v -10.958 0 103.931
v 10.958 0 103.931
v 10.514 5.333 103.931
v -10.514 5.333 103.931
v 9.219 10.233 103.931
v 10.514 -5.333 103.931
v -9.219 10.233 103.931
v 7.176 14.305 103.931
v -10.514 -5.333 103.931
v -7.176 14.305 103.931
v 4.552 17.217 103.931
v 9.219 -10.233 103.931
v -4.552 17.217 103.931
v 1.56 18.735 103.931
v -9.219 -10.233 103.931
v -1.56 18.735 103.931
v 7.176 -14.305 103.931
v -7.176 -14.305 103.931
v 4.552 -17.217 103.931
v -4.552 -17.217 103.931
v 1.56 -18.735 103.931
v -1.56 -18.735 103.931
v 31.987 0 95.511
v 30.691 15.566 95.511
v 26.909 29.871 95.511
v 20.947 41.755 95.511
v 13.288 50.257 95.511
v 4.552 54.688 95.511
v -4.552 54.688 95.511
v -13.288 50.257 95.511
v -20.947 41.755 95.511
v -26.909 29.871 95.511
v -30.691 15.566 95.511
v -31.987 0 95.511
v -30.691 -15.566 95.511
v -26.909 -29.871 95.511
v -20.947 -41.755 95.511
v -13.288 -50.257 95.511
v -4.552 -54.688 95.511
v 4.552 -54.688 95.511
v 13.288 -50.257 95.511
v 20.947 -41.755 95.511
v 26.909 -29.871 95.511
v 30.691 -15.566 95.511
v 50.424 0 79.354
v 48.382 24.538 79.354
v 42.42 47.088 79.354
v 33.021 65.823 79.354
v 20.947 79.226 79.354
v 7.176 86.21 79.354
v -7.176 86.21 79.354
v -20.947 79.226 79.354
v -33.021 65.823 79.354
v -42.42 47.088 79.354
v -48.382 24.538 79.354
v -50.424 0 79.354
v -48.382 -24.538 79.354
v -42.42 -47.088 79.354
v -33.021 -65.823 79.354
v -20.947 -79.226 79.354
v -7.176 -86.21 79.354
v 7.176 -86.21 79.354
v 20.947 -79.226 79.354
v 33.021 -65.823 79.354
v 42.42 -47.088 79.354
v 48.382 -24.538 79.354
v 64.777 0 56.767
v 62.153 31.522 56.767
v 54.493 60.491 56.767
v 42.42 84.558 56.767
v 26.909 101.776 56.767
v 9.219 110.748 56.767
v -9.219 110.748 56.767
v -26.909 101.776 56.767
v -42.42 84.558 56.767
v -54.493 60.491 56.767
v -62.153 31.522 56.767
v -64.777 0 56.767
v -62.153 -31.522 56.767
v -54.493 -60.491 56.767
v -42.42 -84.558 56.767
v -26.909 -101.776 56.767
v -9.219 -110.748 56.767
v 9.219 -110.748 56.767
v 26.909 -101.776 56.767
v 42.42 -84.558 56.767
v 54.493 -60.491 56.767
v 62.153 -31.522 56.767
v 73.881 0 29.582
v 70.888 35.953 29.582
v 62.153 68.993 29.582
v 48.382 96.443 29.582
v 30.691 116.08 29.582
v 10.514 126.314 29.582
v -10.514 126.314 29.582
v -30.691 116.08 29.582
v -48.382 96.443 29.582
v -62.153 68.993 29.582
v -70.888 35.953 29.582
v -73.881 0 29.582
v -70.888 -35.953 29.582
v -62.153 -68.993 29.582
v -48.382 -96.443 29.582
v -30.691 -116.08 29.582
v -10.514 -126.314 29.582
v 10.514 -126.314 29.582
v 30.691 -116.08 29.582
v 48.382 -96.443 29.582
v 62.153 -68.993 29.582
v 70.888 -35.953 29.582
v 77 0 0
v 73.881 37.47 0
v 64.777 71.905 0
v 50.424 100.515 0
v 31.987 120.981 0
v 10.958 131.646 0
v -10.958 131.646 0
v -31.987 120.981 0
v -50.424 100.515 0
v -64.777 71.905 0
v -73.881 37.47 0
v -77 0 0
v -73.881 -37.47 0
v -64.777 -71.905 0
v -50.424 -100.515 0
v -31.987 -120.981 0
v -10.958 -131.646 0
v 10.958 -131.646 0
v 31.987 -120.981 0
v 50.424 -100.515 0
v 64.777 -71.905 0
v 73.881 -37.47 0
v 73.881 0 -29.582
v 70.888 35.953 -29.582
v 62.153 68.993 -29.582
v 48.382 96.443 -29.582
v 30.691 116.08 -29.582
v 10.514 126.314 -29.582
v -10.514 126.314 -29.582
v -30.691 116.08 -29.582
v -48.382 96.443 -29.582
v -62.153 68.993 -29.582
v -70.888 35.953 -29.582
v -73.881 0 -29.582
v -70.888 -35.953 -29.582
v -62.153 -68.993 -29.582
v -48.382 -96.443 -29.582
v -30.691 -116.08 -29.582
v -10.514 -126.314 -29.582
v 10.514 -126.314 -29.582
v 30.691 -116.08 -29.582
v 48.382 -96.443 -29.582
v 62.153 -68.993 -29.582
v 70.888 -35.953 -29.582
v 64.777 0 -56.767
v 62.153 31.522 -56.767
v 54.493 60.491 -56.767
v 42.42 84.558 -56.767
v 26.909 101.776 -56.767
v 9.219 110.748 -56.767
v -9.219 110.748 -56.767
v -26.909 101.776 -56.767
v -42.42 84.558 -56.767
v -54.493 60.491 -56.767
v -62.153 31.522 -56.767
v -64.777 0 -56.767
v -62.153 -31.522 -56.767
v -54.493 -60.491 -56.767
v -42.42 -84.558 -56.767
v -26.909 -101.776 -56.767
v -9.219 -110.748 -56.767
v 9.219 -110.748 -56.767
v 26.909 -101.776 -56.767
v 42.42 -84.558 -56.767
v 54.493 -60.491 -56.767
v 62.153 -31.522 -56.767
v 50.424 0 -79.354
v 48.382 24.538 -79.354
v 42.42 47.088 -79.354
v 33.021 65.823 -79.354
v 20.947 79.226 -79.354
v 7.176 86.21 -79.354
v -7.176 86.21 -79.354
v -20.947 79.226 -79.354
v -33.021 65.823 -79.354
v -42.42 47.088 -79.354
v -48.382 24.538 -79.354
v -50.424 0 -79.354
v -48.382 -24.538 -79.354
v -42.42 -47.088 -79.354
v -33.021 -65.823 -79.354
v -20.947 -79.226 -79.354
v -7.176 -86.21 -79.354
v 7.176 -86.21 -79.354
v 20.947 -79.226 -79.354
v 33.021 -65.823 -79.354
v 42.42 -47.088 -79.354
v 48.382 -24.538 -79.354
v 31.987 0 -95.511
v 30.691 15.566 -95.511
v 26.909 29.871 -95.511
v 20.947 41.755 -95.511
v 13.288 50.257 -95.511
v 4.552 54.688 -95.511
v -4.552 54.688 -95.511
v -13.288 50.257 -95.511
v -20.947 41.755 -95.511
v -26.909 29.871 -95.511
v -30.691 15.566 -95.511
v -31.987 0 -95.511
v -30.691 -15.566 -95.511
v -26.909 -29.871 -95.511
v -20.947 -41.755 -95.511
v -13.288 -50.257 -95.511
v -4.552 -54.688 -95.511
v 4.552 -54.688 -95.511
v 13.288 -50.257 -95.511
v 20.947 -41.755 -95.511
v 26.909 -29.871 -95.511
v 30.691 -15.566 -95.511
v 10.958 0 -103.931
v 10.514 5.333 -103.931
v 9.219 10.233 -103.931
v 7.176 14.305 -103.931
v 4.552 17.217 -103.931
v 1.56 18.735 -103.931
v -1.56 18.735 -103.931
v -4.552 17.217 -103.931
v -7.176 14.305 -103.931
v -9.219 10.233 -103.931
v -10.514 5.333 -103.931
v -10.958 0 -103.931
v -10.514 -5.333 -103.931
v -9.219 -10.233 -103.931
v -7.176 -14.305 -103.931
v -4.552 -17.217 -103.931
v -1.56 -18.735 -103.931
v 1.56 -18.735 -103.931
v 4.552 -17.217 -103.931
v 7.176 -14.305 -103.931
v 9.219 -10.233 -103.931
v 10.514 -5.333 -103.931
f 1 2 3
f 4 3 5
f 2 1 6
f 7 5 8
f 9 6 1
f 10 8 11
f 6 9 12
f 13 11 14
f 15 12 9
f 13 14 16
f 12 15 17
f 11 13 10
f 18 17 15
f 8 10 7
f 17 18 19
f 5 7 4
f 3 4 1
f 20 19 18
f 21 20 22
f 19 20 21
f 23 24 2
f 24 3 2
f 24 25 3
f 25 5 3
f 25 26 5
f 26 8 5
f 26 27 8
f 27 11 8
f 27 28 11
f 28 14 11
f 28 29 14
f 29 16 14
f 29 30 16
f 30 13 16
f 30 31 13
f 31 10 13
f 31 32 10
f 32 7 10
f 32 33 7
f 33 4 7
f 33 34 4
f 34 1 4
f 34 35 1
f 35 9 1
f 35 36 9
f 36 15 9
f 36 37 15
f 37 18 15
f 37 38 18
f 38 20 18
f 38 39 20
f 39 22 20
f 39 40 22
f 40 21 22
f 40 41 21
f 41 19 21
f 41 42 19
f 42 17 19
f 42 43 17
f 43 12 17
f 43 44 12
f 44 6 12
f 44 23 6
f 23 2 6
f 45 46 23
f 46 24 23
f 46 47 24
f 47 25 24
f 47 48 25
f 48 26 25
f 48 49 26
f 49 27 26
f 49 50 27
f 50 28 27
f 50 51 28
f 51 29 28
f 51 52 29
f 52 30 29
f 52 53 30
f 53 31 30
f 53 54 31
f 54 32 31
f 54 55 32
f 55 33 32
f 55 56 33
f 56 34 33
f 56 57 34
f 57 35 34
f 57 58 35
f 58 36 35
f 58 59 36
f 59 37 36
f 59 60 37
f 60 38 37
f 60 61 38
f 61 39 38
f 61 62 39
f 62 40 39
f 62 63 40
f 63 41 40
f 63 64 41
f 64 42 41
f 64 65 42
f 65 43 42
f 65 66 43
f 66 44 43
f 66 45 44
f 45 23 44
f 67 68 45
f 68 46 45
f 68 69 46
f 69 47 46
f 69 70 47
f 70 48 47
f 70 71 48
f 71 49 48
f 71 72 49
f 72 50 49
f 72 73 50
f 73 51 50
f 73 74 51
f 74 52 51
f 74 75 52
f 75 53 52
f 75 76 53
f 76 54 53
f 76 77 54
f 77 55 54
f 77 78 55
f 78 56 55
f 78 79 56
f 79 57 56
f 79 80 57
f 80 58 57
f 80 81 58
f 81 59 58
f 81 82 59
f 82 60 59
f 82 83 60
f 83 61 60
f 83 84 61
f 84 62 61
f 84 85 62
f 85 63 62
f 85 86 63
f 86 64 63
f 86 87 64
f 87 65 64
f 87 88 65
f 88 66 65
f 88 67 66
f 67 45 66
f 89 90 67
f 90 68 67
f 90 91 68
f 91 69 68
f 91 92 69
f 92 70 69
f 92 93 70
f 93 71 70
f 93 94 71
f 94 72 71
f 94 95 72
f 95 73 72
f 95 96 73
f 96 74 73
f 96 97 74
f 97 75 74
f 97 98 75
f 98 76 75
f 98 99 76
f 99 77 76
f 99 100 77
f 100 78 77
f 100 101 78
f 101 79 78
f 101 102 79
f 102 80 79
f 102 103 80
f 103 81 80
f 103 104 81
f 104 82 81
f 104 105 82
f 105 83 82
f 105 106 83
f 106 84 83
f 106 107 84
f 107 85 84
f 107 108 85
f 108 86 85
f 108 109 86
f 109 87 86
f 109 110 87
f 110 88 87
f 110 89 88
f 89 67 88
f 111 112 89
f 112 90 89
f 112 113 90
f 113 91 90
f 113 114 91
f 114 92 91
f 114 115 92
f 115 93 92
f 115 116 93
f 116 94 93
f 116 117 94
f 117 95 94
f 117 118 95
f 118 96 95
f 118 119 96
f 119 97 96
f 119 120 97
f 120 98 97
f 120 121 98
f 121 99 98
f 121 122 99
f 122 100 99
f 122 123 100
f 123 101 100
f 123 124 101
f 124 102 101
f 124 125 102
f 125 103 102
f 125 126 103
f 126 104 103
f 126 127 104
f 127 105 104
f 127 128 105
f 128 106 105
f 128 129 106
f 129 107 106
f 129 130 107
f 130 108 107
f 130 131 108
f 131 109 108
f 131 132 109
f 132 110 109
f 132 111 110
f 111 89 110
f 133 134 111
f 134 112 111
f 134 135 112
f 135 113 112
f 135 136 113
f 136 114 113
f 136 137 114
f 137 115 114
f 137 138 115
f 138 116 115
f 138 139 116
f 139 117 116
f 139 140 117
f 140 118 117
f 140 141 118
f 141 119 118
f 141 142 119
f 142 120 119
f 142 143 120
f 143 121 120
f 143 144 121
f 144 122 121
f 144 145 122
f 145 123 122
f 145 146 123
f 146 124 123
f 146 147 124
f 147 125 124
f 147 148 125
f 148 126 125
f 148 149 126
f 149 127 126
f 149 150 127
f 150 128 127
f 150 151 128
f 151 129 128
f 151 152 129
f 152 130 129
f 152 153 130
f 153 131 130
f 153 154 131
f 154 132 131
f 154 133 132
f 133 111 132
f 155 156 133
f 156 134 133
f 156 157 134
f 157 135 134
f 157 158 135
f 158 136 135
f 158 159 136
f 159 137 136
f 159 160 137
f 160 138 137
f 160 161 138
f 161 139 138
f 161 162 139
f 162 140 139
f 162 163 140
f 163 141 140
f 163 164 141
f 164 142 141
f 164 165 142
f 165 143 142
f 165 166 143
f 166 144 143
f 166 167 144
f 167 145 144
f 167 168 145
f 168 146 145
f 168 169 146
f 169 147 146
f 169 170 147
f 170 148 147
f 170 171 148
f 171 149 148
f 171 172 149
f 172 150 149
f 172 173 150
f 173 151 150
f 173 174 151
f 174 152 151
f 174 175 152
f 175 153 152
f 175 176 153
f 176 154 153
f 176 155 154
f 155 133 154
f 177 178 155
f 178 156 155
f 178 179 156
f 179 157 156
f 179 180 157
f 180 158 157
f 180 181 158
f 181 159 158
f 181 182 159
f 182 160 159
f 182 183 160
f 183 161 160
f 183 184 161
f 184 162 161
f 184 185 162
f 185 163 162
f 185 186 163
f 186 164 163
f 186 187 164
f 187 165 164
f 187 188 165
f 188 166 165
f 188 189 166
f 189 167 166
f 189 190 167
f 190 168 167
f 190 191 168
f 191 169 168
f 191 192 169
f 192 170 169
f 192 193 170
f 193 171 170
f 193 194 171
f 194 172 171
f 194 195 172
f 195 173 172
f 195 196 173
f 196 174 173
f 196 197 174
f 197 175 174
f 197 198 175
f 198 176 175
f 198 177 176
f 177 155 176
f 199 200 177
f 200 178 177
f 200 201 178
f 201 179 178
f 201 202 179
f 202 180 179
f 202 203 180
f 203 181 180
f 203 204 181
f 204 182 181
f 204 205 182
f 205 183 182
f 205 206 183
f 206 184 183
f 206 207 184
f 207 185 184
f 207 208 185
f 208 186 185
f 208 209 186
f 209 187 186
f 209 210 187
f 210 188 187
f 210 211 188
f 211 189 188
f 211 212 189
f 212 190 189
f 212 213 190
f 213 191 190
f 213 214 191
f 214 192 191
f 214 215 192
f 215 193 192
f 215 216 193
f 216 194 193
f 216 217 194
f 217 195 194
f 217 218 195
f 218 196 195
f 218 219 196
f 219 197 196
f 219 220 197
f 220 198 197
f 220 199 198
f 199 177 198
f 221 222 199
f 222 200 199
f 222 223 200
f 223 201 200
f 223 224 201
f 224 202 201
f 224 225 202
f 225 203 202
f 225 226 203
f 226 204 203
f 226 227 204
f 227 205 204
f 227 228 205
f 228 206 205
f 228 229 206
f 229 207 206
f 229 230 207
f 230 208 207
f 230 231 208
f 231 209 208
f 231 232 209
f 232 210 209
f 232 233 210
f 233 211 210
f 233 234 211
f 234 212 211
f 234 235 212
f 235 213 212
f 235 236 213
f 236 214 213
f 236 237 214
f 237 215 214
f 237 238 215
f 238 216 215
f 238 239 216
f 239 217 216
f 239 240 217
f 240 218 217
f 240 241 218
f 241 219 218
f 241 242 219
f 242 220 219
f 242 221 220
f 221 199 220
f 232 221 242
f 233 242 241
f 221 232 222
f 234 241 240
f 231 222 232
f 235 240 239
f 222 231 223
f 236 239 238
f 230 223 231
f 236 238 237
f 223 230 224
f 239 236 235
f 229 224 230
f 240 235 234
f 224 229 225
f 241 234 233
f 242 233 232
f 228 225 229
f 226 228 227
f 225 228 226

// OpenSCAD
// Generated by SolidPython 1.0.1 on 2020-07-29 00:46:50


scale(v = [11, 19, 15]) {
	sphere(r = 7);
}
/***********************************************
*********      SolidPython code:      **********
************************************************
 
# import packages: SolidPython
from solid import *
from solid.utils import *
from itertools import chain, combinations, permutations


class Resize:

    def __init__(self, scad_file):
        self.scad_file = scad_file
        #self.scad_file = import_scad(scad_file)
        # cone/cylinder param:
        self.r1 = 0
        self.r2 = 0
        self.h = 0
        # rectangular prism param:
        self.w = 0
        self.l = 0
        # ellipse param:
        self.r = 0

    # import OpenScad code (file name corresponds to shape)


    # classify shape + parameters
    def assign(self, param1, param2, param3):
        if self.scad_file == 'cone.scad':
            self.r1 = param1
            self.r2 = param2
            self.h = param3
        elif self.scad_file == 'cylinder.scad':
            self.r1 = param1
            self.r2 = param2
            self.h = param3
        elif self.scad_file == 'rectangularPrism.scad':
            self.h = param1
            self.l = param2
            self.w = param3
        else:
            self.r = param1
            self.h = param2

    # resize parameters
    def iterate(self):
        x = range(3, 20, 2)
        i = 1
        if self.scad_file == 'cone.scad':
            tempList = list(permutations(x, 2))
            for temp in tempList:
                param1 = temp[0]
                param2 = temp[1]
                filepath = 'produced_scad_files/' + 'cone' + str(param1) + '_' + str(param2) + '_' + '.scad'
                scad_render_to_file(cylinder(h=param1, r1=param2, r2=0), filepath)

        elif self.scad_file == 'cylinder.scad':
            tempList = list(permutations(x, 3))
            for temp in tempList:
                param1 = temp[0]
                param2 = temp[1]
                filepath = 'produced_scad_files/' + 'cylinder' + str(param1) + '_' + str(param2) + '_' + '.scad'
                scad_render_to_file(cylinder(h=param1, r1=param2, r2=param2), filepath)

        elif self.scad_file == 'rectangularPrism.scad':
            tempList = list(permutations(x, 3))
            for temp in tempList:
                param1 = temp[0]
                param2 = temp[1]
                param3 = temp[2]
                filepath = 'produced_scad_files/' + 'rectangularPrism' + str(param1) + '_' + str(param2) + '_' + str(
                    param3) + '.scad'
                scad_render_to_file(cube(size=(param1, param2, param3)), filepath)

        elif self.scad_file == 'ellipse.scad':
            tempList = list(permutations(x, 4))
            for temp in tempList:
                param1 = temp[0]
                param2 = temp[1]
                param3 = temp[2]
                param4 = temp[3]
                filepath = 'produced_scad_files/' + 'ellipse' + str(param1) + '_' + str(param2) + '_' + str(param3) + '_' + str(param4) + '.scad'
                scad_render_to_file(scale([param1, param2, param3])(sphere(r=param4)), filepath)

    def render_to_scadfile(self):
        scad_render_to_file(scad, 'example.scad') 
 
************************************************/
